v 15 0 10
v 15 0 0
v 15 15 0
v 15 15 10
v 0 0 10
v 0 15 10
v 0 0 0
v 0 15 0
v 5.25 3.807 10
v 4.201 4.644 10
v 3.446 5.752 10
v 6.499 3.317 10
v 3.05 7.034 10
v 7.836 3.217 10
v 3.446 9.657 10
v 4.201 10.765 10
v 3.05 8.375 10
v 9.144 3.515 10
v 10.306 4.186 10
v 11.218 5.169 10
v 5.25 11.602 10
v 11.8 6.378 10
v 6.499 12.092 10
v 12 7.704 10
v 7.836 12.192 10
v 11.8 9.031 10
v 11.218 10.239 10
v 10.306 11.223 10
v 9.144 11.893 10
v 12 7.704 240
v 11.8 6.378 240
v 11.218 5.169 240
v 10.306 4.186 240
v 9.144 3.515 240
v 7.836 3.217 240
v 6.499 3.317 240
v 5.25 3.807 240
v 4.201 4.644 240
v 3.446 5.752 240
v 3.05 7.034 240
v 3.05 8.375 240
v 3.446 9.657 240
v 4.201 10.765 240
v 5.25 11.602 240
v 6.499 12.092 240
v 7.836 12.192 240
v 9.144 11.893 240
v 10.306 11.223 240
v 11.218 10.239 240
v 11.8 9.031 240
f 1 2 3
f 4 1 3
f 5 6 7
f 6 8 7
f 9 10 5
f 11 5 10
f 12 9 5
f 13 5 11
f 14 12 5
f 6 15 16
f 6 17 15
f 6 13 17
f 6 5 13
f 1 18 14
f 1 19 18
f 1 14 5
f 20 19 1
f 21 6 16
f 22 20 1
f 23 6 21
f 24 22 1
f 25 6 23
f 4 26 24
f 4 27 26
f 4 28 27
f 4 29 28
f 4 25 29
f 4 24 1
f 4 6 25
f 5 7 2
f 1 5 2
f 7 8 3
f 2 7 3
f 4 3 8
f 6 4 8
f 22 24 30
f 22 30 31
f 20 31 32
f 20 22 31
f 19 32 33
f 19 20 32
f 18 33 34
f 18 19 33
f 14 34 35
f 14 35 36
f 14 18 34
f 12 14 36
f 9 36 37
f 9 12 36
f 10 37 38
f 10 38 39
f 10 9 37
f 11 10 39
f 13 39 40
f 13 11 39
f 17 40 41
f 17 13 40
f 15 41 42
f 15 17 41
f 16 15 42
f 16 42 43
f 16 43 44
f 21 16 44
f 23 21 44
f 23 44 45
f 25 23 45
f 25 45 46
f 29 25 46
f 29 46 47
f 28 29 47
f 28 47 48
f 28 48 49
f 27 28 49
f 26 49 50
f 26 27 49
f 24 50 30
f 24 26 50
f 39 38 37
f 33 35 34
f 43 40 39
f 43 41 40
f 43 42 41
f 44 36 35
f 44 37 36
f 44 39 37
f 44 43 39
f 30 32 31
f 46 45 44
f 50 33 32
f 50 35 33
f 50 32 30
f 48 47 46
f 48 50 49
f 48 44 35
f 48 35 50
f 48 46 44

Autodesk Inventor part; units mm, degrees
ref_plane "YZ Plane" through (0, 0, 0) normal (1, 0, 0) x (0, 1, 0)
ref_plane "XZ Plane" through (0, 0, 0) normal (0, 1, 0) x (-1, 0, 0)
sketch "Sketch1" plane through (0, 0, 0) normal (0, 0, 1) x (1, 0, 0)
  line L0 (0, 0) -> (15, 0)
  line L1 (15, 0) -> (15, 15)
  line L2 (15, 15) -> (0, 15)
  line L3 (0, 15) -> (0, 0)
  dimension "d0" = 15
  dimension "d1" = 15
extrude "Extrusion1" add sketch "Sketch1" along normal blind 10
sketch "Sketch2" plane through (0, 0, 10) normal (0, 0, 1) x (1, 0, 0)
  line L0 (15, 15) -> (0, 15) projected
  line L1 (0, 15) -> (7.5, 15)
  line L2 (7.5, 15) -> (7.5, 0.4087)
  line L3 (0, 15) -> (0, 0) projected
  line L4 (0, 7.7044) -> (14.7572, 7.5)
  circle A0 centre (7.5, 7.7044) radius 4.5
  dimension "d9" = 9
extrude "Extrusion2" add sketch "Sketch2" along normal blind 230 contours A0 L4 L2 | L2 L4 A0 | L4 A0 L2 | L2 A0 L4
thread "Thread1" size "M11x1.5" class "6g" standard "ANSI Metric M Profile" full length
thread "Thread2" size "M9x1.25" class "6g" standard "ANSI Metric M Profile" full length
sketch "Sketch3" plane through (0, 0, 0) normal (1, 0, 0) x (0, 1, 0)
  point P0 (0, 0)
ref_plane "Work Plane1" through (7.5, 7.7044, 240) normal (0, 0, 1) x (1, 0, 0)
sketch "Sketch4" plane through (7.5, 7.7044, 240) normal (0, 0, 1) x (1, 0, 0)
  point P0 (-7.5, -7.7044)
extrude "Extrusion3" [suppressed]
properties part number "23CM NUT"
